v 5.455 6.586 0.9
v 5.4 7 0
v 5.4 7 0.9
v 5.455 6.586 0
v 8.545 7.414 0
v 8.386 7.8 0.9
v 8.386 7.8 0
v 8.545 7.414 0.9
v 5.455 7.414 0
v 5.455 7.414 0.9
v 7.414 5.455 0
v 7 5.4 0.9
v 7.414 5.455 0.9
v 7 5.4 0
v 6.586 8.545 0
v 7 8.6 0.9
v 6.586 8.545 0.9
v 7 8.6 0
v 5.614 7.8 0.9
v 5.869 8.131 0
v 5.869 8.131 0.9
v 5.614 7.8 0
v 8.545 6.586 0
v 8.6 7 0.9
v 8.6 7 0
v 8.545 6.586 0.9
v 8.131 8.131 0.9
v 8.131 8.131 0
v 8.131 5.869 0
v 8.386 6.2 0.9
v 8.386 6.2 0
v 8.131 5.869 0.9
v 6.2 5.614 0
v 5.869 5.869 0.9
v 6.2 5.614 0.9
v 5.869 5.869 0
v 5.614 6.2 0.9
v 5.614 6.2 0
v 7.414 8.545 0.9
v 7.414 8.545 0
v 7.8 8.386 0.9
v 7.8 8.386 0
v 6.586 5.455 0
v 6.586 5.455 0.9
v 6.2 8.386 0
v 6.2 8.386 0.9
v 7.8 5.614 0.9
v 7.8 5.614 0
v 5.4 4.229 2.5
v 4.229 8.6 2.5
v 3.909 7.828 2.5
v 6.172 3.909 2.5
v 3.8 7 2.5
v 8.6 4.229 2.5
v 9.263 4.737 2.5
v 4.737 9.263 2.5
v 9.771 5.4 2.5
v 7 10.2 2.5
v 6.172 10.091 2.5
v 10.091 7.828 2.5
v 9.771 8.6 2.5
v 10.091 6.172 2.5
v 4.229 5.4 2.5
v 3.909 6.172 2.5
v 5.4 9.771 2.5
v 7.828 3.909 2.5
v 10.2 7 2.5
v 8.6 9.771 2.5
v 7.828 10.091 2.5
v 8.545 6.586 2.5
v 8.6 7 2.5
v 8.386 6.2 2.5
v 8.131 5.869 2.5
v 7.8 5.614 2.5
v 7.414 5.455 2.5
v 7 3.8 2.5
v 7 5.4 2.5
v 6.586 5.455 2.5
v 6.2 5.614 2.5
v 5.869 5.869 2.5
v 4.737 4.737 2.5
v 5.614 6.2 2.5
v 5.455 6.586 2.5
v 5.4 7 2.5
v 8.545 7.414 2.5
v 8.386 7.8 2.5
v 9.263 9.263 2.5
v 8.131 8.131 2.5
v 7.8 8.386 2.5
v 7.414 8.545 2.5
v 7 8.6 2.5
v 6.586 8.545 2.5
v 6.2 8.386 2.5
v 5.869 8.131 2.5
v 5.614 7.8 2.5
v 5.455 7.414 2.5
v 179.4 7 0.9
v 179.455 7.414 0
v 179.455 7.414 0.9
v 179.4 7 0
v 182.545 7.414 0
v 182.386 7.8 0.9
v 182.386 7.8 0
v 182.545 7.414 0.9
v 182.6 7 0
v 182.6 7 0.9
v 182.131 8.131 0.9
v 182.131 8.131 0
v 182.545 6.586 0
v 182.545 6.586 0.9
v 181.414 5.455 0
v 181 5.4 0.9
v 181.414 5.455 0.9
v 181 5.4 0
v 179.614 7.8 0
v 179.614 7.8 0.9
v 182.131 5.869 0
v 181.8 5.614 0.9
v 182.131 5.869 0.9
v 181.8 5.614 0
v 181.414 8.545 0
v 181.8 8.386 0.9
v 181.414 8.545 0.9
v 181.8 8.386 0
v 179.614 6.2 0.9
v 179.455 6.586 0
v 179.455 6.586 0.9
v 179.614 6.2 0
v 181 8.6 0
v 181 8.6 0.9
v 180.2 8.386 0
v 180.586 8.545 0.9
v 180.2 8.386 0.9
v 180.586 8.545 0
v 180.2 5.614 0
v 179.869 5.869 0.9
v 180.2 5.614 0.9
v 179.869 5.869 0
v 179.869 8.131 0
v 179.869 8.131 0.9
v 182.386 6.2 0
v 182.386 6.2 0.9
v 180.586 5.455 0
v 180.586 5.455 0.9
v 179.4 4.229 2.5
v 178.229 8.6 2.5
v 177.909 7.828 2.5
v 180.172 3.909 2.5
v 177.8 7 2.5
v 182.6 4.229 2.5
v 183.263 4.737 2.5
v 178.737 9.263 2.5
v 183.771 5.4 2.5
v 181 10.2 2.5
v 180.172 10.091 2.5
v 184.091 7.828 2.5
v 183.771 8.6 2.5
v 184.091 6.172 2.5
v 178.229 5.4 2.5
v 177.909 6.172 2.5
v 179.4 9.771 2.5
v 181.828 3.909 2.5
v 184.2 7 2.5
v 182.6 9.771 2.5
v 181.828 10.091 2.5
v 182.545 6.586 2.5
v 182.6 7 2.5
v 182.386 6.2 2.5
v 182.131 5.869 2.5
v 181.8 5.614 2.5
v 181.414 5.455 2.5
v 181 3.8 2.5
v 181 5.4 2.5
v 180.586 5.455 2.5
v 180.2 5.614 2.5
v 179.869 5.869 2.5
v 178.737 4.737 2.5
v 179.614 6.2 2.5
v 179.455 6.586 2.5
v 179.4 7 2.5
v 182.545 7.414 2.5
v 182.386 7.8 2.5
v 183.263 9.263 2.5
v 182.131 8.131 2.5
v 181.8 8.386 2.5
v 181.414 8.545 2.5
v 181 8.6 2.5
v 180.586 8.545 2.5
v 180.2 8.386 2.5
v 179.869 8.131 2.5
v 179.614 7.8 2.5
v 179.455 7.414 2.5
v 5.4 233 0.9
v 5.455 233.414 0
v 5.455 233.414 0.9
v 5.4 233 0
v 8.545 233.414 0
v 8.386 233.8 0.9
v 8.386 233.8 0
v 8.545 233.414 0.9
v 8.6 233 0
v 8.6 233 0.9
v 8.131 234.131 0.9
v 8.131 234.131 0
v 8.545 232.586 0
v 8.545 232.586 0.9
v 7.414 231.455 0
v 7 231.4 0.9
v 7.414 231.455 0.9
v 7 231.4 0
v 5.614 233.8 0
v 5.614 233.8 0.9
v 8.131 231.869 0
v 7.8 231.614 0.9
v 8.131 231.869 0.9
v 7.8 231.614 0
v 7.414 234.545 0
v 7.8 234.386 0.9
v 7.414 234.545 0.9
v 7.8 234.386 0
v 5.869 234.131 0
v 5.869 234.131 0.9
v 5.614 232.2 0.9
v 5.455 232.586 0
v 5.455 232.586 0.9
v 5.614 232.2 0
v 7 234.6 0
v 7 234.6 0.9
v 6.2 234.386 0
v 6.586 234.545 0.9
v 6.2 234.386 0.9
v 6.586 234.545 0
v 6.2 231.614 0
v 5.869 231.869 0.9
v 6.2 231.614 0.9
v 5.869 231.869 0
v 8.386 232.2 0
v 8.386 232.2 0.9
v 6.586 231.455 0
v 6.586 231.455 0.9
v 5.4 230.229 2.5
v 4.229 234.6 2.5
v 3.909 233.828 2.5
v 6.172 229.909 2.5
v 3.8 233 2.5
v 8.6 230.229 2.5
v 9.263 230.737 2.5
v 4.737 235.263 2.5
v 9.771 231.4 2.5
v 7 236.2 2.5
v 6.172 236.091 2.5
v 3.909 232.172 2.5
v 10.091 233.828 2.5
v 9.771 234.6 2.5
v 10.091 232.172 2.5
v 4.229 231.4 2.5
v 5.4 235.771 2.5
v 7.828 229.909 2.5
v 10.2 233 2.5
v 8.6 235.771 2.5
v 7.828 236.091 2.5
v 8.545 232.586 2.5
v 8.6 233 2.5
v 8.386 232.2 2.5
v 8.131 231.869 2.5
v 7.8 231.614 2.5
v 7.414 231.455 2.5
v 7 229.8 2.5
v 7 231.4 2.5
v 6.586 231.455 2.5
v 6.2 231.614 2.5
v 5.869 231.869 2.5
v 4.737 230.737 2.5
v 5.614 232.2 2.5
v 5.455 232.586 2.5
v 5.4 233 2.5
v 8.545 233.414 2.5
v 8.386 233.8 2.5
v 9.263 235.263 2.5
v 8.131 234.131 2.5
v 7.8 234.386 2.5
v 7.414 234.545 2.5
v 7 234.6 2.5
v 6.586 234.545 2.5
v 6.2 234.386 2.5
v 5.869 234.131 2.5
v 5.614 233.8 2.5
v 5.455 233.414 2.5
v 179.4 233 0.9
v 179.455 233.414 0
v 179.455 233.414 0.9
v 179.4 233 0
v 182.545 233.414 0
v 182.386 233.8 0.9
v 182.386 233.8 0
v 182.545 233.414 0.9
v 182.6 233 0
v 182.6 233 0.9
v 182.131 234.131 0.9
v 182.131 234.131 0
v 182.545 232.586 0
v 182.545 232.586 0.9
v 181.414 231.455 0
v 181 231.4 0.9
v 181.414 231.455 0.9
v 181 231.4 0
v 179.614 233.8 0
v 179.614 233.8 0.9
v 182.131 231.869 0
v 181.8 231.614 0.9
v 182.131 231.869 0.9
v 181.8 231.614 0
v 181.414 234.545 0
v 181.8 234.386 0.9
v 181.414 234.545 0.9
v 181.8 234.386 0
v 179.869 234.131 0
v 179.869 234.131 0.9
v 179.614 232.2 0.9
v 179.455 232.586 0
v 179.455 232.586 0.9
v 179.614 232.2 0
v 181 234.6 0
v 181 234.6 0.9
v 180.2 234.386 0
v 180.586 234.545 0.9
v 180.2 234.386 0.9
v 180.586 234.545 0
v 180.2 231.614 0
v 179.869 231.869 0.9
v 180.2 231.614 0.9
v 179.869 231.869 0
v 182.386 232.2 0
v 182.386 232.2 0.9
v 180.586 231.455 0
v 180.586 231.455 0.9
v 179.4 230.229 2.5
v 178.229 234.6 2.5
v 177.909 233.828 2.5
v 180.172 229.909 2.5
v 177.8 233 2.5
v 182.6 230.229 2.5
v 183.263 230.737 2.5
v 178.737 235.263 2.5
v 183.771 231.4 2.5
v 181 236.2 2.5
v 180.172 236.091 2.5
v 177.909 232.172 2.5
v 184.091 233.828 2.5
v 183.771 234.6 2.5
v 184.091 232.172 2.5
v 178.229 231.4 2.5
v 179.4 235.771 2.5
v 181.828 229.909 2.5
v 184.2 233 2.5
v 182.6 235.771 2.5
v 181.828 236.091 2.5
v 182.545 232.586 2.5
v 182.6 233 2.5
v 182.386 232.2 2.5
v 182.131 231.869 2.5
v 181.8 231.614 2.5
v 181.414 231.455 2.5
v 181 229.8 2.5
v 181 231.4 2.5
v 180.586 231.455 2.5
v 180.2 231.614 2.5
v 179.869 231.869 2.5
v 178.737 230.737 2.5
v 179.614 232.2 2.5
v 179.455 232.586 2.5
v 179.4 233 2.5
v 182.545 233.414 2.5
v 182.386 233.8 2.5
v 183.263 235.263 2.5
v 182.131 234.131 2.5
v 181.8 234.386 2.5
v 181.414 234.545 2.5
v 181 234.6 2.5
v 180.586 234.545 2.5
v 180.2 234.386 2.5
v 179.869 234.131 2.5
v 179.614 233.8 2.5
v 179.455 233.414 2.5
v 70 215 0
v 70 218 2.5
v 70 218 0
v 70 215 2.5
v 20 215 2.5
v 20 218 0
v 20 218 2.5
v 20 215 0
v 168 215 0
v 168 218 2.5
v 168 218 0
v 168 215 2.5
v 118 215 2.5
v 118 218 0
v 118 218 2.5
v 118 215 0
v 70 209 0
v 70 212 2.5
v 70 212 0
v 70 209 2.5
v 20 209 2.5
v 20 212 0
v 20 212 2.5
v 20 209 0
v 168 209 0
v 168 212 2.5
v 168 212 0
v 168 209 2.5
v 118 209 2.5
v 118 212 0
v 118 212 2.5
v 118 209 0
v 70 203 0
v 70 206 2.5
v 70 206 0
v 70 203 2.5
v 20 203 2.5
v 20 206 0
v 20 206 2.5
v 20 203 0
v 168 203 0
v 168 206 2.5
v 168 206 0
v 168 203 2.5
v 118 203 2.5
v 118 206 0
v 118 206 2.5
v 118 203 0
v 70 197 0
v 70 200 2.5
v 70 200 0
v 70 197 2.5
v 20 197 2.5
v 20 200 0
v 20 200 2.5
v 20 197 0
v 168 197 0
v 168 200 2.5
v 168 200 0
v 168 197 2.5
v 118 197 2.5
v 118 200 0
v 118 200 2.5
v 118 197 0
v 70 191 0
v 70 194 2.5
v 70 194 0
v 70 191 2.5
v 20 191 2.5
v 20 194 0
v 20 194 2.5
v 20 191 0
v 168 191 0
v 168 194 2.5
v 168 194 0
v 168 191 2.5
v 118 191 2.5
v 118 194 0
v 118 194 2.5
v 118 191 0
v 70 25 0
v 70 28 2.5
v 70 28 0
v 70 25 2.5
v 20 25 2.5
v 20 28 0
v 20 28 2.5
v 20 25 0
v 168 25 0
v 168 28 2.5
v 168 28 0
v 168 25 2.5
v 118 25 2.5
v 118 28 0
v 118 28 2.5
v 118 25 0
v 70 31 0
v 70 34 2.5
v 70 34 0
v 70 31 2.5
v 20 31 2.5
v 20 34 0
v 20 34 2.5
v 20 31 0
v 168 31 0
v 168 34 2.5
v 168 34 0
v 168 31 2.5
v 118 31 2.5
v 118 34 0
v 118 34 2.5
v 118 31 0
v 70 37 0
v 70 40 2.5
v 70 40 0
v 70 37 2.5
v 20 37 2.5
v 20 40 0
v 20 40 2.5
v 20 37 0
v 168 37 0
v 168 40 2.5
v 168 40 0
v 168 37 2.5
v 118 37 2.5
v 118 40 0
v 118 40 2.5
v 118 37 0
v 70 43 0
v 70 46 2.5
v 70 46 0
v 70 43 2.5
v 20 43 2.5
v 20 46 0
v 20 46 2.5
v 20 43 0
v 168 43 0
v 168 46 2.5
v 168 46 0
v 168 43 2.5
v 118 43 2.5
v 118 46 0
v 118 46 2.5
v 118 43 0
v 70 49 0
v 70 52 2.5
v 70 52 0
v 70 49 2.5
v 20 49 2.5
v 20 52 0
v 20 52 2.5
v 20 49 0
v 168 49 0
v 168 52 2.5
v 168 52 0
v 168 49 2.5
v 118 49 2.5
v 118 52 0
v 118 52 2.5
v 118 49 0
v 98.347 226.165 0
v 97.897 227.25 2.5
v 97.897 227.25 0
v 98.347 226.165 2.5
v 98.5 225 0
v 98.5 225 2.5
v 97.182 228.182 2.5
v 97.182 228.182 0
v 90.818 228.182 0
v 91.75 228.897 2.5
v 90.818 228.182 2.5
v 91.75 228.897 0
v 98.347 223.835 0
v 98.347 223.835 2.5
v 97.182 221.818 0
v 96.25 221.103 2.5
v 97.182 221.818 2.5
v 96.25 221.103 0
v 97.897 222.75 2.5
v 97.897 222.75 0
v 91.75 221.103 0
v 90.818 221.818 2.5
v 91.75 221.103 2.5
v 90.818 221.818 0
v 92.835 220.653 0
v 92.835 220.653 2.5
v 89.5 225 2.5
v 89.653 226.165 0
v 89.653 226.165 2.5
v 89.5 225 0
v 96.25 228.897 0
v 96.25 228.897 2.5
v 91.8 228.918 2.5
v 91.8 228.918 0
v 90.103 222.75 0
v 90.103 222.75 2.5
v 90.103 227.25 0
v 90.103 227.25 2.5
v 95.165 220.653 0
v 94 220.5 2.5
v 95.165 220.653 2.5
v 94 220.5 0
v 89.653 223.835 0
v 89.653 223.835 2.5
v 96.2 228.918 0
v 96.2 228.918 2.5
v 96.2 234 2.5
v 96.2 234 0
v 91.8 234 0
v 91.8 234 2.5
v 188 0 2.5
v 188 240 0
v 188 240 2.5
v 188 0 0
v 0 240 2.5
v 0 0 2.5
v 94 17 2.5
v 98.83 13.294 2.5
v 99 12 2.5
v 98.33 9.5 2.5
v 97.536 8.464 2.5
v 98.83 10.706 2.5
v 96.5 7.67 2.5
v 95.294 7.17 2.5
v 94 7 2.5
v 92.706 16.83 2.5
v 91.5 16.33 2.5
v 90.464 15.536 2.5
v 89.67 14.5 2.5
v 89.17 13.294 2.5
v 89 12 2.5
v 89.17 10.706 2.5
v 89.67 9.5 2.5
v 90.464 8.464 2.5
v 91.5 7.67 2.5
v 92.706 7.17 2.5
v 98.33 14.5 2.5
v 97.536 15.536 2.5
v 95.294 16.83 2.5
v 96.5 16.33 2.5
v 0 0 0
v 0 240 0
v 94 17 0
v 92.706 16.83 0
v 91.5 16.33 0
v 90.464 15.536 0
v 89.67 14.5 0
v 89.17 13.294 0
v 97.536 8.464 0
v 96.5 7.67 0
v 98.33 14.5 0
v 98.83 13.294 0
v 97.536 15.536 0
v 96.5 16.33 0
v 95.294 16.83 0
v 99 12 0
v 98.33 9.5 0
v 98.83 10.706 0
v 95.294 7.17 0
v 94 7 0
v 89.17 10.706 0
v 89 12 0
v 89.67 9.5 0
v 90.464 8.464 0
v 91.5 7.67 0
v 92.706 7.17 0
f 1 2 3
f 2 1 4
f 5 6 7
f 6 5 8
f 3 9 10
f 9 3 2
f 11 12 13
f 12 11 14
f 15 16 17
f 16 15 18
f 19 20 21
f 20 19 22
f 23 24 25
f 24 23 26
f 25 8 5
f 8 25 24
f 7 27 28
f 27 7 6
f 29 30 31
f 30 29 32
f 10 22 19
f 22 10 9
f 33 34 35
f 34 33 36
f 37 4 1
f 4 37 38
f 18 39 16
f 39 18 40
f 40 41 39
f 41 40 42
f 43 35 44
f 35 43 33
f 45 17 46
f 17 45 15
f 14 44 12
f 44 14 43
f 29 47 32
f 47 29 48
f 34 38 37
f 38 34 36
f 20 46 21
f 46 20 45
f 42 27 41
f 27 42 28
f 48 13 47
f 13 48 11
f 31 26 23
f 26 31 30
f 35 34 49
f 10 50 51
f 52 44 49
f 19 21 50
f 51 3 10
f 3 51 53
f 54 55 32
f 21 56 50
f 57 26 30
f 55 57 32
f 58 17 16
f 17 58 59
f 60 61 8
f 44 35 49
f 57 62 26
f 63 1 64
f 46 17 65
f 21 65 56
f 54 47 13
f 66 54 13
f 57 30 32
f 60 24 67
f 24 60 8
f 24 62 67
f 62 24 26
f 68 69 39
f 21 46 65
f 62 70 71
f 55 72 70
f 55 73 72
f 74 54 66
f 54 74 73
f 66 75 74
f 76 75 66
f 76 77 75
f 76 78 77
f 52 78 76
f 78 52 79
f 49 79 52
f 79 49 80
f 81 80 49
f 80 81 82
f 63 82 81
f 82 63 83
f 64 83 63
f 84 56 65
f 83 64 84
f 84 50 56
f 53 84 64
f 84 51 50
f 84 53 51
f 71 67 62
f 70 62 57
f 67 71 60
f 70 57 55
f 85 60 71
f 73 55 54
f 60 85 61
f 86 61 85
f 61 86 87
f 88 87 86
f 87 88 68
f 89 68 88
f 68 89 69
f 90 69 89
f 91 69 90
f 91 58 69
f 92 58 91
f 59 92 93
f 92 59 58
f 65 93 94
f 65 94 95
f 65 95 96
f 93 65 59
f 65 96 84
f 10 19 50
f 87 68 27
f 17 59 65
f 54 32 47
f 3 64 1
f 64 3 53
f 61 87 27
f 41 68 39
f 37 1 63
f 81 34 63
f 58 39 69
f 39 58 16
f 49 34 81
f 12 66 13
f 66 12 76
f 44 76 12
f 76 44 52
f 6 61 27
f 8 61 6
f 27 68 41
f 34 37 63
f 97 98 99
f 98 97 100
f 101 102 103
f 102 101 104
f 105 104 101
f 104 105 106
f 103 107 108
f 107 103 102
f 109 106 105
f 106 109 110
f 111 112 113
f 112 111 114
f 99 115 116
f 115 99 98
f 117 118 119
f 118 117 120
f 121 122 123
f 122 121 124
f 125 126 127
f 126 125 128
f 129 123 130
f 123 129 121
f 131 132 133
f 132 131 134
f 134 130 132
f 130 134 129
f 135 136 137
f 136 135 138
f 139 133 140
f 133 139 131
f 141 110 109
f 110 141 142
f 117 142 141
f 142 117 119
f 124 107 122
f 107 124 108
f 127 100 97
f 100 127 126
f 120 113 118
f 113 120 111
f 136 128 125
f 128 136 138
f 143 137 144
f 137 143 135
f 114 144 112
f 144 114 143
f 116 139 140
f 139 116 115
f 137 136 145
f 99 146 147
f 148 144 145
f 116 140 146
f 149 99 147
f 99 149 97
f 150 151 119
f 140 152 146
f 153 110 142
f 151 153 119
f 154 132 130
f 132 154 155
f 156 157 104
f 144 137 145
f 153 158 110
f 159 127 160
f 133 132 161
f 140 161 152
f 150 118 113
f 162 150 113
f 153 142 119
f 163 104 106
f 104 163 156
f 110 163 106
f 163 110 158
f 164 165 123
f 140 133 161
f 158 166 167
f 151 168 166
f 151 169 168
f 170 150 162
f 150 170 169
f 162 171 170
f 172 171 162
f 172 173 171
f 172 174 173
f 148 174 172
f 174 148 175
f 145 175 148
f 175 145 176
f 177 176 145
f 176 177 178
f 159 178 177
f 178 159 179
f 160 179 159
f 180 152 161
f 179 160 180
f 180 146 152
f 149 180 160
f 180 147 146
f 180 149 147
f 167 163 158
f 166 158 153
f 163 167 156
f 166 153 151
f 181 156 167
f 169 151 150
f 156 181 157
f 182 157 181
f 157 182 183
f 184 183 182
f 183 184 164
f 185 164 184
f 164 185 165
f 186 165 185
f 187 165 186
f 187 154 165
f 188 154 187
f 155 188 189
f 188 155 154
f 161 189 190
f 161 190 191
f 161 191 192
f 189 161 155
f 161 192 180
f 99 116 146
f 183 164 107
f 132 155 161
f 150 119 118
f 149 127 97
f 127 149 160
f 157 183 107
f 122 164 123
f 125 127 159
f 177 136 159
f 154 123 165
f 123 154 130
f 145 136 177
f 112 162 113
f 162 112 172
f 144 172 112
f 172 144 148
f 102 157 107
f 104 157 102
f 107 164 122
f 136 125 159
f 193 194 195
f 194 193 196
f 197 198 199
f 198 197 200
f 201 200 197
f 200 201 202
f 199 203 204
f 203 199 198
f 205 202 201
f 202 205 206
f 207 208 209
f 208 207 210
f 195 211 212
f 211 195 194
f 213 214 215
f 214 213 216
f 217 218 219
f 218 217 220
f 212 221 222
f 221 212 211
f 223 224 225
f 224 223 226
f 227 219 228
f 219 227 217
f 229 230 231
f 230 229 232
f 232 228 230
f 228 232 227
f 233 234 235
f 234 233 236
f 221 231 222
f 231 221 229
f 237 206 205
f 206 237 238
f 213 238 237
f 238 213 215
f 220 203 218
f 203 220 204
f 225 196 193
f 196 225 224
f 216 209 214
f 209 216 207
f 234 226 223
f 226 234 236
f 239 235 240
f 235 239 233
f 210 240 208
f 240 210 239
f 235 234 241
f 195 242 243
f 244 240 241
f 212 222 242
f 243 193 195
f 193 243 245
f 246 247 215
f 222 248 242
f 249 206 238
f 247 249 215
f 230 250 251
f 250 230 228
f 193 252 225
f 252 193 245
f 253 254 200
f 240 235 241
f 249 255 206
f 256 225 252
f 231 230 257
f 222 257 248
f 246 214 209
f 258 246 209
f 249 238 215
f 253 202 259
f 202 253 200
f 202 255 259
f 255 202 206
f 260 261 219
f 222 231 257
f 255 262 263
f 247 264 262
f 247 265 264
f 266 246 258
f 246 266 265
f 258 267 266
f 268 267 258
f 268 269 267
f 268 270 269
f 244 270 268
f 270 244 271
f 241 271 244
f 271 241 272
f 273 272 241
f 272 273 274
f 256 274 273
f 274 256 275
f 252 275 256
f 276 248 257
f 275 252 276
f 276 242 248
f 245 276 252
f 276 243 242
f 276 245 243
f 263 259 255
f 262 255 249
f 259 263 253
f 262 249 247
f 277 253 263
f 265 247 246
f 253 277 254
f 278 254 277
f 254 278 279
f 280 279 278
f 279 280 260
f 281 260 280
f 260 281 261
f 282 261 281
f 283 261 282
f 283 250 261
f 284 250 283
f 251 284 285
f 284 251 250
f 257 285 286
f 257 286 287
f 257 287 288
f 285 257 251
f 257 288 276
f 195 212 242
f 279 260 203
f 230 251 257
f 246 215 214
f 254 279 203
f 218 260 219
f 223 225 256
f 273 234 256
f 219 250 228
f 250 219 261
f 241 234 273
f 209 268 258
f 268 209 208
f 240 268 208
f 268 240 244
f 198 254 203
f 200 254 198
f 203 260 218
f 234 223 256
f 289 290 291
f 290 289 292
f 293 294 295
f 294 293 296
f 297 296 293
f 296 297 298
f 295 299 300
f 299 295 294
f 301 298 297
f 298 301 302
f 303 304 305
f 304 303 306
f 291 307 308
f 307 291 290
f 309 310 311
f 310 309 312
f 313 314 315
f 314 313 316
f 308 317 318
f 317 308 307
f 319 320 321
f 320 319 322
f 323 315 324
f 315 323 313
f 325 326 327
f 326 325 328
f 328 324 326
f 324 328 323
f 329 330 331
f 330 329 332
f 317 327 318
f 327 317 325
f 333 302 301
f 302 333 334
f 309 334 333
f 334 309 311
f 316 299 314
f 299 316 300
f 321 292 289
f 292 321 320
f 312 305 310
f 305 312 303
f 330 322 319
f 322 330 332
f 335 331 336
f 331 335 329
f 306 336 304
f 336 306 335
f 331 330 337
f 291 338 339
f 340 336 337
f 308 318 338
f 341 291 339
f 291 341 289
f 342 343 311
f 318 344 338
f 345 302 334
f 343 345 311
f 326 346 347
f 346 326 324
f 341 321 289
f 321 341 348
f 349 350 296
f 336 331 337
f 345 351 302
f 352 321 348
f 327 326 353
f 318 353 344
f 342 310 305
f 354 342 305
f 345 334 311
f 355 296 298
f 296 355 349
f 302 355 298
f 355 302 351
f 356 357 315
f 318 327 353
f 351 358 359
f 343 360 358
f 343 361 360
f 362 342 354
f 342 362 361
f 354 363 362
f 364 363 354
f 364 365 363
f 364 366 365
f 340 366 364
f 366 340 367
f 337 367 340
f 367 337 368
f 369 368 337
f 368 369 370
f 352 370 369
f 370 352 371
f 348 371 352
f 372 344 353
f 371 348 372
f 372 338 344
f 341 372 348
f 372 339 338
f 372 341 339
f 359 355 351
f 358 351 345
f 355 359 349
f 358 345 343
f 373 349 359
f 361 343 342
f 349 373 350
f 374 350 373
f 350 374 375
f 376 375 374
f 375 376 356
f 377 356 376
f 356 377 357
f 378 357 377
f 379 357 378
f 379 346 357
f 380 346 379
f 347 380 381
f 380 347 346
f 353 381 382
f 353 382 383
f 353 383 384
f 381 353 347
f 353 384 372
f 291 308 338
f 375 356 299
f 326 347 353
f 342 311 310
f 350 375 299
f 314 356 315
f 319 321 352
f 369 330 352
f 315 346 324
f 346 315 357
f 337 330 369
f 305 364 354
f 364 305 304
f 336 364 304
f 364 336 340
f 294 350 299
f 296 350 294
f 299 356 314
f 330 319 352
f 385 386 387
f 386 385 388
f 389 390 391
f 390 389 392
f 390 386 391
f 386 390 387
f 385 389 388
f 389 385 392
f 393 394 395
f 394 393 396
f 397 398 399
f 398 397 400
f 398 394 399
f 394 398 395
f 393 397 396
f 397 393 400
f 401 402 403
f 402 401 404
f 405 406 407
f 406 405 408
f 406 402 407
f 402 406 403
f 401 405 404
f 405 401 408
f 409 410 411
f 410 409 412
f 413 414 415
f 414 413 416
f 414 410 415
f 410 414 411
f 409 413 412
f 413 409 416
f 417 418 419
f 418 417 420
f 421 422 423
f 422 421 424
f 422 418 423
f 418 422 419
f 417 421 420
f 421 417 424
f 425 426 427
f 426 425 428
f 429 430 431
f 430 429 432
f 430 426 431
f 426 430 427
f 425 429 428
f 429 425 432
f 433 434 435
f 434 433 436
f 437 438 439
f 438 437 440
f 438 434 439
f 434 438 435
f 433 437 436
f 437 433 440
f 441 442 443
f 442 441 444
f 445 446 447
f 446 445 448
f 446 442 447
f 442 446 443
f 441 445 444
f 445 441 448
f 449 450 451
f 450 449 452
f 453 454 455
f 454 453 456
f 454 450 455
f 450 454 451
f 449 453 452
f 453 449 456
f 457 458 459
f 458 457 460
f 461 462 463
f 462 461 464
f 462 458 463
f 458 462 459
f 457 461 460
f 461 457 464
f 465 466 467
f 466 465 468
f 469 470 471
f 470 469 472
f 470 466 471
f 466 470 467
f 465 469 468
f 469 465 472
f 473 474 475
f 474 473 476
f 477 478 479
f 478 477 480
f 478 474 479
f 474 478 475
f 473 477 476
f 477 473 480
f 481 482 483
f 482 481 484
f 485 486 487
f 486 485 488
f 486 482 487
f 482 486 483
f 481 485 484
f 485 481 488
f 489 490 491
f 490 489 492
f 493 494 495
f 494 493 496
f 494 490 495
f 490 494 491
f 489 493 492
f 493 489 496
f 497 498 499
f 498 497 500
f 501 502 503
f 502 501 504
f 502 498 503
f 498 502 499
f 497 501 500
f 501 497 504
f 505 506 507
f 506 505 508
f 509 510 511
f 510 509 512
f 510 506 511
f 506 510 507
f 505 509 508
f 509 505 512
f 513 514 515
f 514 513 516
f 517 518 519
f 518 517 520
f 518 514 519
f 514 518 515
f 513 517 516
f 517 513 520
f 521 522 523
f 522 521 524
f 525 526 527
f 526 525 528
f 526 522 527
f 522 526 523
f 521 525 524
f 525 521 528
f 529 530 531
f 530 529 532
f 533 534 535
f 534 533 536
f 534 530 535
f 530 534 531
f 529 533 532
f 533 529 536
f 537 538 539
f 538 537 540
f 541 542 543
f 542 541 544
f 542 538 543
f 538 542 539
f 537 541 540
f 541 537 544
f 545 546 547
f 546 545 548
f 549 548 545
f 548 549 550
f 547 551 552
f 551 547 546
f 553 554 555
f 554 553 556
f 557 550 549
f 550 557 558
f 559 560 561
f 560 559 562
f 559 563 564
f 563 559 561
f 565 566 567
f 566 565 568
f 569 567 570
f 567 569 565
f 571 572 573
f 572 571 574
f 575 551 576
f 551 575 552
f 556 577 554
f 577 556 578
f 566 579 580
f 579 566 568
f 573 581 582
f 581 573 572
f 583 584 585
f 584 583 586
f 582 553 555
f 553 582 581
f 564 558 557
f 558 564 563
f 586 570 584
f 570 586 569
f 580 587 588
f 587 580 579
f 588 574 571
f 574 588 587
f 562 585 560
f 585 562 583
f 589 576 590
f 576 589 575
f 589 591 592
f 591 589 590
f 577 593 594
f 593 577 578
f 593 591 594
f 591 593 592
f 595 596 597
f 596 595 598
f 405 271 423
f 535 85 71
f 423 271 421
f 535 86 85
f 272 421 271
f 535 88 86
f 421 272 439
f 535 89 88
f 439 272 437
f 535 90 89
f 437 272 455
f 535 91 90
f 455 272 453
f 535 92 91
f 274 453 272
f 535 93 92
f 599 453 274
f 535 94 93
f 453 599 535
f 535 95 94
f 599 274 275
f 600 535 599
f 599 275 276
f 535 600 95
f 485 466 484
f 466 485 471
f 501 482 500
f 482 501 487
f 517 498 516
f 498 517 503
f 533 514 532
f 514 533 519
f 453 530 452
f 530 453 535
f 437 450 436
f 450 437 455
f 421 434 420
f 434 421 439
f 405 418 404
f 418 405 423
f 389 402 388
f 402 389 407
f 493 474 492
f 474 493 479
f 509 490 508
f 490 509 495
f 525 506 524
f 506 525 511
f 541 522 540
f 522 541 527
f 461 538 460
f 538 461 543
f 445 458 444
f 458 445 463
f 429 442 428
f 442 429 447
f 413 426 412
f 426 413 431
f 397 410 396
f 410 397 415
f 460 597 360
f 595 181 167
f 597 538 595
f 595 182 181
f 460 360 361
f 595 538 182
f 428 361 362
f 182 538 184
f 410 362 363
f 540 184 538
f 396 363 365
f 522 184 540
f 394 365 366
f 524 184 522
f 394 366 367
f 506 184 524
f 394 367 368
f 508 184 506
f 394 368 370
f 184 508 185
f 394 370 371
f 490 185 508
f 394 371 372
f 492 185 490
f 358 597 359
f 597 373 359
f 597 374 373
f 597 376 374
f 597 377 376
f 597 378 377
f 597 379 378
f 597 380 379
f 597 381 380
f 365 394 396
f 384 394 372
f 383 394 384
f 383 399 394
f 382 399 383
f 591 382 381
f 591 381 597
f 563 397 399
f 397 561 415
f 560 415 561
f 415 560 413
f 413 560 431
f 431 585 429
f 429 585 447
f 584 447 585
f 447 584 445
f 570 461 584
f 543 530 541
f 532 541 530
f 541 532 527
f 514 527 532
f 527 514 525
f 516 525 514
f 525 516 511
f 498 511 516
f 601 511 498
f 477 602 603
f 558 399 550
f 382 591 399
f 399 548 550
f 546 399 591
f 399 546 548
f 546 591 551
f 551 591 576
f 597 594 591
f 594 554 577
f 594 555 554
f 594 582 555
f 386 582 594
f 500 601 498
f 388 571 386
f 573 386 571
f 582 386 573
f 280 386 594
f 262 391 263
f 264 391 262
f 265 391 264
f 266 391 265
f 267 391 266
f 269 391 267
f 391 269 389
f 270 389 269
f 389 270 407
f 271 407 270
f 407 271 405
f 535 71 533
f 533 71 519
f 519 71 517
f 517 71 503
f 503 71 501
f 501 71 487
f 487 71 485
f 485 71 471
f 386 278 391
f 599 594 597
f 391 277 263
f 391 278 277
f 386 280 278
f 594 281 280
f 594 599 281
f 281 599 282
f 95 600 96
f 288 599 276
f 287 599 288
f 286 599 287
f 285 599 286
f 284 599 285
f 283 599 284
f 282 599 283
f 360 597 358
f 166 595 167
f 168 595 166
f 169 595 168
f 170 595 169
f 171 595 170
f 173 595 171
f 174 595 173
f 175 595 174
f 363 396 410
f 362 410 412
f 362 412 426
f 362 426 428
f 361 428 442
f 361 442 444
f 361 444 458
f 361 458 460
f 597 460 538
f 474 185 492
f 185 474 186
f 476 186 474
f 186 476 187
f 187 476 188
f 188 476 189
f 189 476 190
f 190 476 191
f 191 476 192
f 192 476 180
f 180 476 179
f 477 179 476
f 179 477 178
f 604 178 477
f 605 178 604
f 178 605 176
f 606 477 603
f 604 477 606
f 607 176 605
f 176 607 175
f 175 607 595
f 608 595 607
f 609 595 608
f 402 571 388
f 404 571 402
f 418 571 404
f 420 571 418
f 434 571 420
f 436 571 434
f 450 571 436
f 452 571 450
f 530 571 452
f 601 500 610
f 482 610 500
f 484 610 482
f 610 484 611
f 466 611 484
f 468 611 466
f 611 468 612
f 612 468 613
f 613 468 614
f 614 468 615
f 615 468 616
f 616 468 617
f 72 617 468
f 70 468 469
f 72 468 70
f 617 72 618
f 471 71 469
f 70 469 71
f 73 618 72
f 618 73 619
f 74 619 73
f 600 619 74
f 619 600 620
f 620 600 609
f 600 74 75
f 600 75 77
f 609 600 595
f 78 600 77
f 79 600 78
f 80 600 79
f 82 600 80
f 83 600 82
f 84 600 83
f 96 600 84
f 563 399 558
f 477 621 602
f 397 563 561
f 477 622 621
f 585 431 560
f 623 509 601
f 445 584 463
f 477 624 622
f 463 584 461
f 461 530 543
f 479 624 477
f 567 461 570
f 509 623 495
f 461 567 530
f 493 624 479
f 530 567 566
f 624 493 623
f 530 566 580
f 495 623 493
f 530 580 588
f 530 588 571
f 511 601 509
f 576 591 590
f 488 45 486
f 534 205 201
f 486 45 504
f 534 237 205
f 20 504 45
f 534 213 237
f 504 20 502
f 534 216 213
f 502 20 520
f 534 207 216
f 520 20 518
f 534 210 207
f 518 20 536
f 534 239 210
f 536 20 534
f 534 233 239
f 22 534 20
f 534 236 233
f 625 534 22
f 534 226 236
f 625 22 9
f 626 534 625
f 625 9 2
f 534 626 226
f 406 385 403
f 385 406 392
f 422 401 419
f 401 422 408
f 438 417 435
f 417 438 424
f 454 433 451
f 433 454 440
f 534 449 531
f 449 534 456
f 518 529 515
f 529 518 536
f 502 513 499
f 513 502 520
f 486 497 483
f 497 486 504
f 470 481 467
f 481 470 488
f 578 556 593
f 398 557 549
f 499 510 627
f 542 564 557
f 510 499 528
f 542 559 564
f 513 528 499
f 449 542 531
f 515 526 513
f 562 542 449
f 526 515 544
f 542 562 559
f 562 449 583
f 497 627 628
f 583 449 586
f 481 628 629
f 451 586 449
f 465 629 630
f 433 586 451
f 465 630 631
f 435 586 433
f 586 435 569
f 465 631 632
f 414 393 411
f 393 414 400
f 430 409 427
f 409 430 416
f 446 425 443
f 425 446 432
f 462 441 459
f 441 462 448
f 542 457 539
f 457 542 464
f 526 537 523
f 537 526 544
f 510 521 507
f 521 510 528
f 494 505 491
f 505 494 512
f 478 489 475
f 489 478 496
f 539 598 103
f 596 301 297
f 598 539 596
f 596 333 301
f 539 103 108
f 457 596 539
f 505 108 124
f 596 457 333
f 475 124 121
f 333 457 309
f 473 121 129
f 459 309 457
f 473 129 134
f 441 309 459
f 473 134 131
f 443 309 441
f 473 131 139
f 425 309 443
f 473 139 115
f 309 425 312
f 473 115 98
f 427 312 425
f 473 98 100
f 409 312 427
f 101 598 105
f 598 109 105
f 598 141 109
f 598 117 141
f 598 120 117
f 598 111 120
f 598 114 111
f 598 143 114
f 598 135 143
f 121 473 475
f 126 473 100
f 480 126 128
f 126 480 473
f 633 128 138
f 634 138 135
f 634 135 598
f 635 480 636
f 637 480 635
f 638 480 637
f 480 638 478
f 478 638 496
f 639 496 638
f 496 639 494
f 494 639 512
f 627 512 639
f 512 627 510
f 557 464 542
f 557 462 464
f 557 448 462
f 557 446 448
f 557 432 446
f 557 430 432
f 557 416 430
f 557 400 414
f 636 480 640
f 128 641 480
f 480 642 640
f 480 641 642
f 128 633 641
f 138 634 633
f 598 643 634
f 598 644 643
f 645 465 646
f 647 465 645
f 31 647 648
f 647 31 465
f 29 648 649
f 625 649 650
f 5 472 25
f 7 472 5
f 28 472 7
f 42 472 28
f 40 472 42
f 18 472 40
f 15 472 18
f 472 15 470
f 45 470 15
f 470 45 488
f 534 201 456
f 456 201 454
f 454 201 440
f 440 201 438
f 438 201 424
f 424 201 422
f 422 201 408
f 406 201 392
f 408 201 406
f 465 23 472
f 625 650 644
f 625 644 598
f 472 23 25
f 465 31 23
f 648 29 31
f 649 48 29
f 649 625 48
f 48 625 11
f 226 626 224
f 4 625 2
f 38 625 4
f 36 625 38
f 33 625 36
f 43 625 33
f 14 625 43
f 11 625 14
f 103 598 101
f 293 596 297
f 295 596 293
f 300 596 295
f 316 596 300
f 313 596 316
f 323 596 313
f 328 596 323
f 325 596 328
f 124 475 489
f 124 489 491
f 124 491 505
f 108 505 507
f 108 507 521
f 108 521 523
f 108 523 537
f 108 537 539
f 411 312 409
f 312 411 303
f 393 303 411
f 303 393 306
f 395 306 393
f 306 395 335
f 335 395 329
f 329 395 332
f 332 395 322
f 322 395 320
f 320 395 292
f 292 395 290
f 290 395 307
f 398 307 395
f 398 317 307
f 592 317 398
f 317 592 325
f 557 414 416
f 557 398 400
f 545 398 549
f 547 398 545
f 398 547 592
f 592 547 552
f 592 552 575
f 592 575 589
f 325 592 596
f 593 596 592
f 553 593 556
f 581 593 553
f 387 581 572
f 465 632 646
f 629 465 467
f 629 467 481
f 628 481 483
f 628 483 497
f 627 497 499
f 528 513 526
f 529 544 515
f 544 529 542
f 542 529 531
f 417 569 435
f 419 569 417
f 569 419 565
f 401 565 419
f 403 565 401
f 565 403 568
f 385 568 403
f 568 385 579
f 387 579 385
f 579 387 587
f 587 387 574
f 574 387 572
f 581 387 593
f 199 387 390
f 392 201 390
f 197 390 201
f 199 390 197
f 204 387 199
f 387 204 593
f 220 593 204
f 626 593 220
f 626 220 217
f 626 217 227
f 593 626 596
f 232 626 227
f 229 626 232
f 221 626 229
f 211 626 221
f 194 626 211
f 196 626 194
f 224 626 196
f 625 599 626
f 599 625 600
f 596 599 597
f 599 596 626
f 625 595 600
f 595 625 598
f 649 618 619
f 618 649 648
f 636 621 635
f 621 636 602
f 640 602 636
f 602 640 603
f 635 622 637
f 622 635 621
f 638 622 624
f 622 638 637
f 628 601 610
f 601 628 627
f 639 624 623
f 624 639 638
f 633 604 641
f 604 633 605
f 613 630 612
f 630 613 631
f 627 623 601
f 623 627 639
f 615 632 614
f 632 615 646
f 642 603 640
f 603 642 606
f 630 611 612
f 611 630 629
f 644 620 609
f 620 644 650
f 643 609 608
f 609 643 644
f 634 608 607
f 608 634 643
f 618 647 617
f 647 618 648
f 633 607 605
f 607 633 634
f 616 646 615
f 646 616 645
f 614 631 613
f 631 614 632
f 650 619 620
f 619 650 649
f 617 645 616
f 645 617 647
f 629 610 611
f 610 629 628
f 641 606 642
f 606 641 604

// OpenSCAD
// ==============================================================================
// WORDCLOCK ESP32 - PIEZA 3: TAPA TRASERA CON VENTILACIONES (REAR COVER LID)
// Parametric OpenSCAD Model for Bambu Lab (256x256 mm build plate)
// Proporción 4:5: 188.0 mm x 240.0 mm
// ==============================================================================

// --- Parameters ---
box_w       = 188.0;
box_h       = 240.0;
wall_thick  = 3.0;
lid_thick   = 2.5;     // Grosor de la tapa trasera (mm)

// --- Module: Tapa Trasera Completa ---
module wordclock_back_lid() {
    difference() {
        // 1. Placa Base de la Tapa (188 x 240 mm)
        cube([box_w, box_h, lid_thick]);

        // 2. Orificios avellanados (Countersunk) en las 4 esquinas para tornillos M3
        screw_off = wall_thick + 4.0;
        
        // Esquina Inferior Izquierda
        translate([screw_off, screw_off, -0.1]) {
            cylinder(r = 1.6, h = lid_thick + 0.2, $fn = 24);
            translate([0, 0, 1.0]) cylinder(r1 = 1.6, r2 = 3.2, h = 1.6, $fn = 24);
        }
        // Esquina Inferior Derecha
        translate([box_w - screw_off, screw_off, -0.1]) {
            cylinder(r = 1.6, h = lid_thick + 0.2, $fn = 24);
            translate([0, 0, 1.0]) cylinder(r1 = 1.6, r2 = 3.2, h = 1.6, $fn = 24);
        }
        // Esquina Superior Izquierda
        translate([screw_off, box_h - screw_off, -0.1]) {
            cylinder(r = 1.6, h = lid_thick + 0.2, $fn = 24);
            translate([0, 0, 1.0]) cylinder(r1 = 1.6, r2 = 3.2, h = 1.6, $fn = 24);
        }
        // Esquina Superior Derecha
        translate([box_w - screw_off, box_h - screw_off, -0.1]) {
            cylinder(r = 1.6, h = lid_thick + 0.2, $fn = 24);
            translate([0, 0, 1.0]) cylinder(r1 = 1.6, r2 = 3.2, h = 1.6, $fn = 24);
        }

        // 3. Ranuras de Ventilación Superior (Cooling Vents Left & Right)
        for (i = [0 : 4]) {
            y_slot = box_h - 25 - (i * 6);
            // Rejilla Izquierda
            translate([20, y_slot, -0.1]) cube([50, 3.0, lid_thick + 0.2]);
            // Rejilla Derecha
            translate([box_w - 70, y_slot, -0.1]) cube([50, 3.0, lid_thick + 0.2]);
        }

        // 4. Ranuras de Ventilación Inferior (Cooling Vents Left & Right)
        for (i = [0 : 4]) {
            y_slot = 25 + (i * 6);
            // Rejilla Izquierda
            translate([20, y_slot, -0.1]) cube([50, 3.0, lid_thick + 0.2]);
            // Rejilla Derecha
            translate([box_w - 70, y_slot, -0.1]) cube([50, 3.0, lid_thick + 0.2]);
        }

        // 5. Orificio para Conector de Alimentación (Jack DC / Cable USB-C)
        translate([box_w / 2, 12, -0.1]) {
            cylinder(r = 5.0, h = lid_thick + 0.2, $fn = 24);
        }

        // 6. Muesca en forma de cerradura (Keyhole) para colgar en pared
        translate([box_w / 2, box_h - 15, -0.1]) {
            union() {
                cylinder(r = 4.5, h = lid_thick + 0.2, $fn = 24);
                translate([-2.2, 0, 0]) cube([4.4, 9.0, lid_thick + 0.2]);
            }
        }
    }
}

// Generar modelo
wordclock_back_lid();
